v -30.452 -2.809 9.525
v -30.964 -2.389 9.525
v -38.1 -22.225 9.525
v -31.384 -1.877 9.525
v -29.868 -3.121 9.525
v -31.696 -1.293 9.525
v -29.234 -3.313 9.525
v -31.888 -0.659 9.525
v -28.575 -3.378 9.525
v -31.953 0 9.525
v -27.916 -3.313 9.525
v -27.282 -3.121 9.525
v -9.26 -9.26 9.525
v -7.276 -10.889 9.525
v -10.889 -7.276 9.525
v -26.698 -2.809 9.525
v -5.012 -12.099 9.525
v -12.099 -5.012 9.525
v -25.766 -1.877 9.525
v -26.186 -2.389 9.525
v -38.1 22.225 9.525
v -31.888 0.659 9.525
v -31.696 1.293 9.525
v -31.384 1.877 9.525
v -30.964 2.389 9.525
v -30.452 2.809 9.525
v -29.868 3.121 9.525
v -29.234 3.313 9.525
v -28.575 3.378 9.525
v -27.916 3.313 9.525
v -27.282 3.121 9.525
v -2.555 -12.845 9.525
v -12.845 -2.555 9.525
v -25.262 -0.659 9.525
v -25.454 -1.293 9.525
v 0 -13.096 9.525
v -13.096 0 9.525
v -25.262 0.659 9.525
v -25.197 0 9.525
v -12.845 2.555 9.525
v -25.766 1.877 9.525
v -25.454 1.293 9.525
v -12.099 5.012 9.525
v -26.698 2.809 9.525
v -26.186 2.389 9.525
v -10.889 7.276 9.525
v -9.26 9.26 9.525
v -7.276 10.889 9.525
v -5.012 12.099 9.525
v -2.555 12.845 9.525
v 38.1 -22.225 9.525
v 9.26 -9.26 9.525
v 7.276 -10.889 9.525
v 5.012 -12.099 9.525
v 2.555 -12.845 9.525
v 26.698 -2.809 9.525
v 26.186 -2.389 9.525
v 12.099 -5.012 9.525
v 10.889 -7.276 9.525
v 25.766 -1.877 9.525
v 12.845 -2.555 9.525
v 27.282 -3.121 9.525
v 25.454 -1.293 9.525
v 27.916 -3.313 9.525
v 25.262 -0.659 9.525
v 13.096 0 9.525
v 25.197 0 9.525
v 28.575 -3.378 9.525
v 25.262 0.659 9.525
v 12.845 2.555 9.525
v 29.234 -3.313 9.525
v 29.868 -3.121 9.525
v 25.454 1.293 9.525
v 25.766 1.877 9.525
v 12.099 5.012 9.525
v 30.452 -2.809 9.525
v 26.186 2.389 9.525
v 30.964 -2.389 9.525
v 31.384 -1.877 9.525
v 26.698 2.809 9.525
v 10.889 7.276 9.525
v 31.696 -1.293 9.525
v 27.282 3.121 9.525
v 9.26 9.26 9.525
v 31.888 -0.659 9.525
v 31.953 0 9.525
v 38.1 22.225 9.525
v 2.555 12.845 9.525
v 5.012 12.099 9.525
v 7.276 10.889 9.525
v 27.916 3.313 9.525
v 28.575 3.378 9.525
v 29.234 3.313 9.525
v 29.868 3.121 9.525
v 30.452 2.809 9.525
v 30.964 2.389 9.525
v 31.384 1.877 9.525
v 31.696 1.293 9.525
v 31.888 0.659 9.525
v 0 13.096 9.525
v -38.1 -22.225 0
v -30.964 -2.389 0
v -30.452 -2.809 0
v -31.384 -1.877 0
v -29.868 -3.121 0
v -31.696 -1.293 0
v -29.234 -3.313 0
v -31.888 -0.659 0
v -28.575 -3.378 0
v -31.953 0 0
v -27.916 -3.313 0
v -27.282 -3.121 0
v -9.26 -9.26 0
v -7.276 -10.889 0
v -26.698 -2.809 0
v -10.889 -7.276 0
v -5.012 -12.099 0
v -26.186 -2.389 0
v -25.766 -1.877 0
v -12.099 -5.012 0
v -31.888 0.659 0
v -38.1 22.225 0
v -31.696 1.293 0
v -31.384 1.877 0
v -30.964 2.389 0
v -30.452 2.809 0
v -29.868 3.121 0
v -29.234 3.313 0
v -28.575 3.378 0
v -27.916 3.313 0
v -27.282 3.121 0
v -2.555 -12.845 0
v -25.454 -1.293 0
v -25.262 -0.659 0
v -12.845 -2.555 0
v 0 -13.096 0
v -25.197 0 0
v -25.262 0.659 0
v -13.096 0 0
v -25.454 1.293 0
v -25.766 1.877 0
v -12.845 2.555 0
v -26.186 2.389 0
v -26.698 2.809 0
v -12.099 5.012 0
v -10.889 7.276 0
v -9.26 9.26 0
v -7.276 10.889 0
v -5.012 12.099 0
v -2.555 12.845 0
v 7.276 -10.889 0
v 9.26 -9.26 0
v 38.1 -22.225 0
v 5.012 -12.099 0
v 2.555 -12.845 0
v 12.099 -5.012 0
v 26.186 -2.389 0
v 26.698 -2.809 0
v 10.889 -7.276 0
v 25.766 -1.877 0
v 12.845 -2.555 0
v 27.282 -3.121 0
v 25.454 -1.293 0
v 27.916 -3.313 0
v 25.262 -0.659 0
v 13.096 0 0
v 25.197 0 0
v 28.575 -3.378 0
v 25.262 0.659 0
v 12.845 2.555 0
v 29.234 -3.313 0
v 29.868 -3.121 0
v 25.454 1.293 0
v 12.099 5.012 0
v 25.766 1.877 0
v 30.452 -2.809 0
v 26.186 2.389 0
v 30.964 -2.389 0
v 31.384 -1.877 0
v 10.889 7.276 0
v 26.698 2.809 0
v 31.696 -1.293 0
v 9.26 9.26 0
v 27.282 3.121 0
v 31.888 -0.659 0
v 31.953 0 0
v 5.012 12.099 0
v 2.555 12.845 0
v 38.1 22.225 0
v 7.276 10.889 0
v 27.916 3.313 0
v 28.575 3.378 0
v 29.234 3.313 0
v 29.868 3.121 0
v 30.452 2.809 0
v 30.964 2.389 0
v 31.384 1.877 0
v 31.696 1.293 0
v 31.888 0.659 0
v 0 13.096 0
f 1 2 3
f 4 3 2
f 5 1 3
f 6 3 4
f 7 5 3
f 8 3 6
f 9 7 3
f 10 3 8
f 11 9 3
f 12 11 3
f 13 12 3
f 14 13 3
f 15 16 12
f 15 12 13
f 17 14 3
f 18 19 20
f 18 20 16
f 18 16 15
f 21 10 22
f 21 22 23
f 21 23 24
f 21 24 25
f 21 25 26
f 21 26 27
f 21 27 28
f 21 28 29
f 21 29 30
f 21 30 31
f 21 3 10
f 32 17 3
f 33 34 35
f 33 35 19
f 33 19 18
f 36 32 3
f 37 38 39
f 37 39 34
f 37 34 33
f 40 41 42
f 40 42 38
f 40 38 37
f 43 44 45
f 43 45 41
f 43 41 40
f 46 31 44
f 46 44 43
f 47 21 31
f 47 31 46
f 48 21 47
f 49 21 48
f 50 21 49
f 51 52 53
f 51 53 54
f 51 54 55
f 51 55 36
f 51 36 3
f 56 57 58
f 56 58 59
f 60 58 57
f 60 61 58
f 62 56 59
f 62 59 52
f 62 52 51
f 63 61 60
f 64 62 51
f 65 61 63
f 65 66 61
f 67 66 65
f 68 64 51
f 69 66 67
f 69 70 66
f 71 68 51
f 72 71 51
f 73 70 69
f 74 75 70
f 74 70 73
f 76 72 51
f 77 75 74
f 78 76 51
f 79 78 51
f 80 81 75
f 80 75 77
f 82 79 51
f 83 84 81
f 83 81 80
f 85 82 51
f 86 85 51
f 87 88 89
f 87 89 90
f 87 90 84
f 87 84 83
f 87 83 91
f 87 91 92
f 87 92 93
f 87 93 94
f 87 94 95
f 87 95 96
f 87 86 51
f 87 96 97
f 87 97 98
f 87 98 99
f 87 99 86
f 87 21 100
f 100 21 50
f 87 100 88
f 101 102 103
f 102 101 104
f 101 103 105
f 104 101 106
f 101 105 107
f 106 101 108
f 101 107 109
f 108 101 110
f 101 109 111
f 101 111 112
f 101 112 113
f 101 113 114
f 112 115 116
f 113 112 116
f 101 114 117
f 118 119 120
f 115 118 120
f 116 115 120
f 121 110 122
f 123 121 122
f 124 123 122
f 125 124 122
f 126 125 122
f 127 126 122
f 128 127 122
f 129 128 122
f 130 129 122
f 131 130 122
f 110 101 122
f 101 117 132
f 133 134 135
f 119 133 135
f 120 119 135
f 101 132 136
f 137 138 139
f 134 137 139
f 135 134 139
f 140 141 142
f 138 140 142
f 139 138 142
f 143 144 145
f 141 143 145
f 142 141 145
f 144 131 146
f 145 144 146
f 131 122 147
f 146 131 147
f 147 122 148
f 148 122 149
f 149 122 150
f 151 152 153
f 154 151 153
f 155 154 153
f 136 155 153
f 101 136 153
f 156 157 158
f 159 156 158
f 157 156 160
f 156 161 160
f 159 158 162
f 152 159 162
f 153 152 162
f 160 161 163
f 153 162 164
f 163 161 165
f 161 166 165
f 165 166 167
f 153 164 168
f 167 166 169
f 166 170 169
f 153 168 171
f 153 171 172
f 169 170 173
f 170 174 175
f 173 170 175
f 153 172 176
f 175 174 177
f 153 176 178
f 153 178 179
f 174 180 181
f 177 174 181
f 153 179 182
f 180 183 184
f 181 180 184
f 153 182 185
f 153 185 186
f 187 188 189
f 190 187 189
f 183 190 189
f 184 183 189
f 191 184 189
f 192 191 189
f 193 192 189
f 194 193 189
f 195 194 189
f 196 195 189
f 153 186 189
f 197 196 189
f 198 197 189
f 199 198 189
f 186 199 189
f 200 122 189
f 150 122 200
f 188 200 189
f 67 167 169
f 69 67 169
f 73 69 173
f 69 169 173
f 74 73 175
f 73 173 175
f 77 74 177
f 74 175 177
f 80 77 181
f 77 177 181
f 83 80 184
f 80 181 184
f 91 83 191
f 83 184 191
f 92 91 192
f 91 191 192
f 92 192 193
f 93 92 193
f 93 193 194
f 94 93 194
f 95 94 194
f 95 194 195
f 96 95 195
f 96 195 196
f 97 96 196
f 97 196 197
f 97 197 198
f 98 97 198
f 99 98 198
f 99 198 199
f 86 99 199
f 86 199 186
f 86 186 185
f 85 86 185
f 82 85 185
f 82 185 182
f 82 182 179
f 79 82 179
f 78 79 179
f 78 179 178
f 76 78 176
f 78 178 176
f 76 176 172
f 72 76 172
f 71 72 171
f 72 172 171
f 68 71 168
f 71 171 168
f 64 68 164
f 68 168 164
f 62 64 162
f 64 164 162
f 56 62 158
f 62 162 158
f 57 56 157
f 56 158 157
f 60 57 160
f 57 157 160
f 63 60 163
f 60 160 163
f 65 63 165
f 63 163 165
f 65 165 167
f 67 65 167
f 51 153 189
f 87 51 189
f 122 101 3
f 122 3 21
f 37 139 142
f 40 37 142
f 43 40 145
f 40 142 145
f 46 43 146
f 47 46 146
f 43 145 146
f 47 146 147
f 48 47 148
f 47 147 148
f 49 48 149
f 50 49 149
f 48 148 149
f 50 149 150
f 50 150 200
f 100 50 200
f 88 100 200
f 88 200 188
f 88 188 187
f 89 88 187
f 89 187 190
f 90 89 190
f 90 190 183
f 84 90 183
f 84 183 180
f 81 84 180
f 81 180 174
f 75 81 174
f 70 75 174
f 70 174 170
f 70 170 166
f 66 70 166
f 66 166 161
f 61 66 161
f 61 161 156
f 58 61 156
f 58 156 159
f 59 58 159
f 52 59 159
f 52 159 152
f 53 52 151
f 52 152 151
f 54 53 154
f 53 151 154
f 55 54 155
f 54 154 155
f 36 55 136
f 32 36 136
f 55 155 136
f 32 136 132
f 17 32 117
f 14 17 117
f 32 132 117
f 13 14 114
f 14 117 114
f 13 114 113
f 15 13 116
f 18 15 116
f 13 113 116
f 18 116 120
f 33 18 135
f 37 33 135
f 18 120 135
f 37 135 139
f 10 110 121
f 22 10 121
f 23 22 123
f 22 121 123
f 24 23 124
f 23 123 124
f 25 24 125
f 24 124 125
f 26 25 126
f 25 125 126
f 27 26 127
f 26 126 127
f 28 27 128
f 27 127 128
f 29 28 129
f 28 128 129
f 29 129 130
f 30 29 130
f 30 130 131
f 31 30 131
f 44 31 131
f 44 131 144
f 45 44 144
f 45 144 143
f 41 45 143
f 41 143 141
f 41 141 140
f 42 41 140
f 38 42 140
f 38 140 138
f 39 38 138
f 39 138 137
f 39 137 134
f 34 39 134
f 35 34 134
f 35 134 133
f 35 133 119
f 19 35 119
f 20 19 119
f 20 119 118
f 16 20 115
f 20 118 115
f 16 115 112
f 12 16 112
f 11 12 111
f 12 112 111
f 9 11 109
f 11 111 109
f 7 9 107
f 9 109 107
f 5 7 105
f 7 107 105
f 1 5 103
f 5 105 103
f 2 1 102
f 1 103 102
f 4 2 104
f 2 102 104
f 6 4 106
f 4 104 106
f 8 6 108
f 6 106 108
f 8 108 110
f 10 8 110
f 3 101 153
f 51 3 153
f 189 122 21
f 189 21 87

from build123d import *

# Parameters (mm, degrees)
SKETCH1_W               = 76.2
SKETCH1_H               = 44.45
BOSS_EXTRUDE1_DEPTH     = 9.525
F_1_CLEARANCE_HOLE1_D   = 26.19248
F_1_4_CLEARANCE_HOLE1_D = 6.7564


with BuildPart() as part:
    # Sketch1 → Boss-Extrude1 (new body)
    with BuildSketch(Plane.XY):
        Rectangle(SKETCH1_W, SKETCH1_H)
    extrude(amount=BOSS_EXTRUDE1_DEPTH)

    # 1 Clearance Hole1 (through all)
    with Locations(Plane.XY.offset(9.525)):
        with Locations((0, 0)):
            Hole(F_1_CLEARANCE_HOLE1_D / 2)

    # 1/4 Clearance Hole1 (through all)
    with Locations(Plane.XY.offset(9.525)):
        with Locations((-28.575, 0), (28.575, 0)):
            Hole(F_1_4_CLEARANCE_HOLE1_D / 2)


solid = part.part
